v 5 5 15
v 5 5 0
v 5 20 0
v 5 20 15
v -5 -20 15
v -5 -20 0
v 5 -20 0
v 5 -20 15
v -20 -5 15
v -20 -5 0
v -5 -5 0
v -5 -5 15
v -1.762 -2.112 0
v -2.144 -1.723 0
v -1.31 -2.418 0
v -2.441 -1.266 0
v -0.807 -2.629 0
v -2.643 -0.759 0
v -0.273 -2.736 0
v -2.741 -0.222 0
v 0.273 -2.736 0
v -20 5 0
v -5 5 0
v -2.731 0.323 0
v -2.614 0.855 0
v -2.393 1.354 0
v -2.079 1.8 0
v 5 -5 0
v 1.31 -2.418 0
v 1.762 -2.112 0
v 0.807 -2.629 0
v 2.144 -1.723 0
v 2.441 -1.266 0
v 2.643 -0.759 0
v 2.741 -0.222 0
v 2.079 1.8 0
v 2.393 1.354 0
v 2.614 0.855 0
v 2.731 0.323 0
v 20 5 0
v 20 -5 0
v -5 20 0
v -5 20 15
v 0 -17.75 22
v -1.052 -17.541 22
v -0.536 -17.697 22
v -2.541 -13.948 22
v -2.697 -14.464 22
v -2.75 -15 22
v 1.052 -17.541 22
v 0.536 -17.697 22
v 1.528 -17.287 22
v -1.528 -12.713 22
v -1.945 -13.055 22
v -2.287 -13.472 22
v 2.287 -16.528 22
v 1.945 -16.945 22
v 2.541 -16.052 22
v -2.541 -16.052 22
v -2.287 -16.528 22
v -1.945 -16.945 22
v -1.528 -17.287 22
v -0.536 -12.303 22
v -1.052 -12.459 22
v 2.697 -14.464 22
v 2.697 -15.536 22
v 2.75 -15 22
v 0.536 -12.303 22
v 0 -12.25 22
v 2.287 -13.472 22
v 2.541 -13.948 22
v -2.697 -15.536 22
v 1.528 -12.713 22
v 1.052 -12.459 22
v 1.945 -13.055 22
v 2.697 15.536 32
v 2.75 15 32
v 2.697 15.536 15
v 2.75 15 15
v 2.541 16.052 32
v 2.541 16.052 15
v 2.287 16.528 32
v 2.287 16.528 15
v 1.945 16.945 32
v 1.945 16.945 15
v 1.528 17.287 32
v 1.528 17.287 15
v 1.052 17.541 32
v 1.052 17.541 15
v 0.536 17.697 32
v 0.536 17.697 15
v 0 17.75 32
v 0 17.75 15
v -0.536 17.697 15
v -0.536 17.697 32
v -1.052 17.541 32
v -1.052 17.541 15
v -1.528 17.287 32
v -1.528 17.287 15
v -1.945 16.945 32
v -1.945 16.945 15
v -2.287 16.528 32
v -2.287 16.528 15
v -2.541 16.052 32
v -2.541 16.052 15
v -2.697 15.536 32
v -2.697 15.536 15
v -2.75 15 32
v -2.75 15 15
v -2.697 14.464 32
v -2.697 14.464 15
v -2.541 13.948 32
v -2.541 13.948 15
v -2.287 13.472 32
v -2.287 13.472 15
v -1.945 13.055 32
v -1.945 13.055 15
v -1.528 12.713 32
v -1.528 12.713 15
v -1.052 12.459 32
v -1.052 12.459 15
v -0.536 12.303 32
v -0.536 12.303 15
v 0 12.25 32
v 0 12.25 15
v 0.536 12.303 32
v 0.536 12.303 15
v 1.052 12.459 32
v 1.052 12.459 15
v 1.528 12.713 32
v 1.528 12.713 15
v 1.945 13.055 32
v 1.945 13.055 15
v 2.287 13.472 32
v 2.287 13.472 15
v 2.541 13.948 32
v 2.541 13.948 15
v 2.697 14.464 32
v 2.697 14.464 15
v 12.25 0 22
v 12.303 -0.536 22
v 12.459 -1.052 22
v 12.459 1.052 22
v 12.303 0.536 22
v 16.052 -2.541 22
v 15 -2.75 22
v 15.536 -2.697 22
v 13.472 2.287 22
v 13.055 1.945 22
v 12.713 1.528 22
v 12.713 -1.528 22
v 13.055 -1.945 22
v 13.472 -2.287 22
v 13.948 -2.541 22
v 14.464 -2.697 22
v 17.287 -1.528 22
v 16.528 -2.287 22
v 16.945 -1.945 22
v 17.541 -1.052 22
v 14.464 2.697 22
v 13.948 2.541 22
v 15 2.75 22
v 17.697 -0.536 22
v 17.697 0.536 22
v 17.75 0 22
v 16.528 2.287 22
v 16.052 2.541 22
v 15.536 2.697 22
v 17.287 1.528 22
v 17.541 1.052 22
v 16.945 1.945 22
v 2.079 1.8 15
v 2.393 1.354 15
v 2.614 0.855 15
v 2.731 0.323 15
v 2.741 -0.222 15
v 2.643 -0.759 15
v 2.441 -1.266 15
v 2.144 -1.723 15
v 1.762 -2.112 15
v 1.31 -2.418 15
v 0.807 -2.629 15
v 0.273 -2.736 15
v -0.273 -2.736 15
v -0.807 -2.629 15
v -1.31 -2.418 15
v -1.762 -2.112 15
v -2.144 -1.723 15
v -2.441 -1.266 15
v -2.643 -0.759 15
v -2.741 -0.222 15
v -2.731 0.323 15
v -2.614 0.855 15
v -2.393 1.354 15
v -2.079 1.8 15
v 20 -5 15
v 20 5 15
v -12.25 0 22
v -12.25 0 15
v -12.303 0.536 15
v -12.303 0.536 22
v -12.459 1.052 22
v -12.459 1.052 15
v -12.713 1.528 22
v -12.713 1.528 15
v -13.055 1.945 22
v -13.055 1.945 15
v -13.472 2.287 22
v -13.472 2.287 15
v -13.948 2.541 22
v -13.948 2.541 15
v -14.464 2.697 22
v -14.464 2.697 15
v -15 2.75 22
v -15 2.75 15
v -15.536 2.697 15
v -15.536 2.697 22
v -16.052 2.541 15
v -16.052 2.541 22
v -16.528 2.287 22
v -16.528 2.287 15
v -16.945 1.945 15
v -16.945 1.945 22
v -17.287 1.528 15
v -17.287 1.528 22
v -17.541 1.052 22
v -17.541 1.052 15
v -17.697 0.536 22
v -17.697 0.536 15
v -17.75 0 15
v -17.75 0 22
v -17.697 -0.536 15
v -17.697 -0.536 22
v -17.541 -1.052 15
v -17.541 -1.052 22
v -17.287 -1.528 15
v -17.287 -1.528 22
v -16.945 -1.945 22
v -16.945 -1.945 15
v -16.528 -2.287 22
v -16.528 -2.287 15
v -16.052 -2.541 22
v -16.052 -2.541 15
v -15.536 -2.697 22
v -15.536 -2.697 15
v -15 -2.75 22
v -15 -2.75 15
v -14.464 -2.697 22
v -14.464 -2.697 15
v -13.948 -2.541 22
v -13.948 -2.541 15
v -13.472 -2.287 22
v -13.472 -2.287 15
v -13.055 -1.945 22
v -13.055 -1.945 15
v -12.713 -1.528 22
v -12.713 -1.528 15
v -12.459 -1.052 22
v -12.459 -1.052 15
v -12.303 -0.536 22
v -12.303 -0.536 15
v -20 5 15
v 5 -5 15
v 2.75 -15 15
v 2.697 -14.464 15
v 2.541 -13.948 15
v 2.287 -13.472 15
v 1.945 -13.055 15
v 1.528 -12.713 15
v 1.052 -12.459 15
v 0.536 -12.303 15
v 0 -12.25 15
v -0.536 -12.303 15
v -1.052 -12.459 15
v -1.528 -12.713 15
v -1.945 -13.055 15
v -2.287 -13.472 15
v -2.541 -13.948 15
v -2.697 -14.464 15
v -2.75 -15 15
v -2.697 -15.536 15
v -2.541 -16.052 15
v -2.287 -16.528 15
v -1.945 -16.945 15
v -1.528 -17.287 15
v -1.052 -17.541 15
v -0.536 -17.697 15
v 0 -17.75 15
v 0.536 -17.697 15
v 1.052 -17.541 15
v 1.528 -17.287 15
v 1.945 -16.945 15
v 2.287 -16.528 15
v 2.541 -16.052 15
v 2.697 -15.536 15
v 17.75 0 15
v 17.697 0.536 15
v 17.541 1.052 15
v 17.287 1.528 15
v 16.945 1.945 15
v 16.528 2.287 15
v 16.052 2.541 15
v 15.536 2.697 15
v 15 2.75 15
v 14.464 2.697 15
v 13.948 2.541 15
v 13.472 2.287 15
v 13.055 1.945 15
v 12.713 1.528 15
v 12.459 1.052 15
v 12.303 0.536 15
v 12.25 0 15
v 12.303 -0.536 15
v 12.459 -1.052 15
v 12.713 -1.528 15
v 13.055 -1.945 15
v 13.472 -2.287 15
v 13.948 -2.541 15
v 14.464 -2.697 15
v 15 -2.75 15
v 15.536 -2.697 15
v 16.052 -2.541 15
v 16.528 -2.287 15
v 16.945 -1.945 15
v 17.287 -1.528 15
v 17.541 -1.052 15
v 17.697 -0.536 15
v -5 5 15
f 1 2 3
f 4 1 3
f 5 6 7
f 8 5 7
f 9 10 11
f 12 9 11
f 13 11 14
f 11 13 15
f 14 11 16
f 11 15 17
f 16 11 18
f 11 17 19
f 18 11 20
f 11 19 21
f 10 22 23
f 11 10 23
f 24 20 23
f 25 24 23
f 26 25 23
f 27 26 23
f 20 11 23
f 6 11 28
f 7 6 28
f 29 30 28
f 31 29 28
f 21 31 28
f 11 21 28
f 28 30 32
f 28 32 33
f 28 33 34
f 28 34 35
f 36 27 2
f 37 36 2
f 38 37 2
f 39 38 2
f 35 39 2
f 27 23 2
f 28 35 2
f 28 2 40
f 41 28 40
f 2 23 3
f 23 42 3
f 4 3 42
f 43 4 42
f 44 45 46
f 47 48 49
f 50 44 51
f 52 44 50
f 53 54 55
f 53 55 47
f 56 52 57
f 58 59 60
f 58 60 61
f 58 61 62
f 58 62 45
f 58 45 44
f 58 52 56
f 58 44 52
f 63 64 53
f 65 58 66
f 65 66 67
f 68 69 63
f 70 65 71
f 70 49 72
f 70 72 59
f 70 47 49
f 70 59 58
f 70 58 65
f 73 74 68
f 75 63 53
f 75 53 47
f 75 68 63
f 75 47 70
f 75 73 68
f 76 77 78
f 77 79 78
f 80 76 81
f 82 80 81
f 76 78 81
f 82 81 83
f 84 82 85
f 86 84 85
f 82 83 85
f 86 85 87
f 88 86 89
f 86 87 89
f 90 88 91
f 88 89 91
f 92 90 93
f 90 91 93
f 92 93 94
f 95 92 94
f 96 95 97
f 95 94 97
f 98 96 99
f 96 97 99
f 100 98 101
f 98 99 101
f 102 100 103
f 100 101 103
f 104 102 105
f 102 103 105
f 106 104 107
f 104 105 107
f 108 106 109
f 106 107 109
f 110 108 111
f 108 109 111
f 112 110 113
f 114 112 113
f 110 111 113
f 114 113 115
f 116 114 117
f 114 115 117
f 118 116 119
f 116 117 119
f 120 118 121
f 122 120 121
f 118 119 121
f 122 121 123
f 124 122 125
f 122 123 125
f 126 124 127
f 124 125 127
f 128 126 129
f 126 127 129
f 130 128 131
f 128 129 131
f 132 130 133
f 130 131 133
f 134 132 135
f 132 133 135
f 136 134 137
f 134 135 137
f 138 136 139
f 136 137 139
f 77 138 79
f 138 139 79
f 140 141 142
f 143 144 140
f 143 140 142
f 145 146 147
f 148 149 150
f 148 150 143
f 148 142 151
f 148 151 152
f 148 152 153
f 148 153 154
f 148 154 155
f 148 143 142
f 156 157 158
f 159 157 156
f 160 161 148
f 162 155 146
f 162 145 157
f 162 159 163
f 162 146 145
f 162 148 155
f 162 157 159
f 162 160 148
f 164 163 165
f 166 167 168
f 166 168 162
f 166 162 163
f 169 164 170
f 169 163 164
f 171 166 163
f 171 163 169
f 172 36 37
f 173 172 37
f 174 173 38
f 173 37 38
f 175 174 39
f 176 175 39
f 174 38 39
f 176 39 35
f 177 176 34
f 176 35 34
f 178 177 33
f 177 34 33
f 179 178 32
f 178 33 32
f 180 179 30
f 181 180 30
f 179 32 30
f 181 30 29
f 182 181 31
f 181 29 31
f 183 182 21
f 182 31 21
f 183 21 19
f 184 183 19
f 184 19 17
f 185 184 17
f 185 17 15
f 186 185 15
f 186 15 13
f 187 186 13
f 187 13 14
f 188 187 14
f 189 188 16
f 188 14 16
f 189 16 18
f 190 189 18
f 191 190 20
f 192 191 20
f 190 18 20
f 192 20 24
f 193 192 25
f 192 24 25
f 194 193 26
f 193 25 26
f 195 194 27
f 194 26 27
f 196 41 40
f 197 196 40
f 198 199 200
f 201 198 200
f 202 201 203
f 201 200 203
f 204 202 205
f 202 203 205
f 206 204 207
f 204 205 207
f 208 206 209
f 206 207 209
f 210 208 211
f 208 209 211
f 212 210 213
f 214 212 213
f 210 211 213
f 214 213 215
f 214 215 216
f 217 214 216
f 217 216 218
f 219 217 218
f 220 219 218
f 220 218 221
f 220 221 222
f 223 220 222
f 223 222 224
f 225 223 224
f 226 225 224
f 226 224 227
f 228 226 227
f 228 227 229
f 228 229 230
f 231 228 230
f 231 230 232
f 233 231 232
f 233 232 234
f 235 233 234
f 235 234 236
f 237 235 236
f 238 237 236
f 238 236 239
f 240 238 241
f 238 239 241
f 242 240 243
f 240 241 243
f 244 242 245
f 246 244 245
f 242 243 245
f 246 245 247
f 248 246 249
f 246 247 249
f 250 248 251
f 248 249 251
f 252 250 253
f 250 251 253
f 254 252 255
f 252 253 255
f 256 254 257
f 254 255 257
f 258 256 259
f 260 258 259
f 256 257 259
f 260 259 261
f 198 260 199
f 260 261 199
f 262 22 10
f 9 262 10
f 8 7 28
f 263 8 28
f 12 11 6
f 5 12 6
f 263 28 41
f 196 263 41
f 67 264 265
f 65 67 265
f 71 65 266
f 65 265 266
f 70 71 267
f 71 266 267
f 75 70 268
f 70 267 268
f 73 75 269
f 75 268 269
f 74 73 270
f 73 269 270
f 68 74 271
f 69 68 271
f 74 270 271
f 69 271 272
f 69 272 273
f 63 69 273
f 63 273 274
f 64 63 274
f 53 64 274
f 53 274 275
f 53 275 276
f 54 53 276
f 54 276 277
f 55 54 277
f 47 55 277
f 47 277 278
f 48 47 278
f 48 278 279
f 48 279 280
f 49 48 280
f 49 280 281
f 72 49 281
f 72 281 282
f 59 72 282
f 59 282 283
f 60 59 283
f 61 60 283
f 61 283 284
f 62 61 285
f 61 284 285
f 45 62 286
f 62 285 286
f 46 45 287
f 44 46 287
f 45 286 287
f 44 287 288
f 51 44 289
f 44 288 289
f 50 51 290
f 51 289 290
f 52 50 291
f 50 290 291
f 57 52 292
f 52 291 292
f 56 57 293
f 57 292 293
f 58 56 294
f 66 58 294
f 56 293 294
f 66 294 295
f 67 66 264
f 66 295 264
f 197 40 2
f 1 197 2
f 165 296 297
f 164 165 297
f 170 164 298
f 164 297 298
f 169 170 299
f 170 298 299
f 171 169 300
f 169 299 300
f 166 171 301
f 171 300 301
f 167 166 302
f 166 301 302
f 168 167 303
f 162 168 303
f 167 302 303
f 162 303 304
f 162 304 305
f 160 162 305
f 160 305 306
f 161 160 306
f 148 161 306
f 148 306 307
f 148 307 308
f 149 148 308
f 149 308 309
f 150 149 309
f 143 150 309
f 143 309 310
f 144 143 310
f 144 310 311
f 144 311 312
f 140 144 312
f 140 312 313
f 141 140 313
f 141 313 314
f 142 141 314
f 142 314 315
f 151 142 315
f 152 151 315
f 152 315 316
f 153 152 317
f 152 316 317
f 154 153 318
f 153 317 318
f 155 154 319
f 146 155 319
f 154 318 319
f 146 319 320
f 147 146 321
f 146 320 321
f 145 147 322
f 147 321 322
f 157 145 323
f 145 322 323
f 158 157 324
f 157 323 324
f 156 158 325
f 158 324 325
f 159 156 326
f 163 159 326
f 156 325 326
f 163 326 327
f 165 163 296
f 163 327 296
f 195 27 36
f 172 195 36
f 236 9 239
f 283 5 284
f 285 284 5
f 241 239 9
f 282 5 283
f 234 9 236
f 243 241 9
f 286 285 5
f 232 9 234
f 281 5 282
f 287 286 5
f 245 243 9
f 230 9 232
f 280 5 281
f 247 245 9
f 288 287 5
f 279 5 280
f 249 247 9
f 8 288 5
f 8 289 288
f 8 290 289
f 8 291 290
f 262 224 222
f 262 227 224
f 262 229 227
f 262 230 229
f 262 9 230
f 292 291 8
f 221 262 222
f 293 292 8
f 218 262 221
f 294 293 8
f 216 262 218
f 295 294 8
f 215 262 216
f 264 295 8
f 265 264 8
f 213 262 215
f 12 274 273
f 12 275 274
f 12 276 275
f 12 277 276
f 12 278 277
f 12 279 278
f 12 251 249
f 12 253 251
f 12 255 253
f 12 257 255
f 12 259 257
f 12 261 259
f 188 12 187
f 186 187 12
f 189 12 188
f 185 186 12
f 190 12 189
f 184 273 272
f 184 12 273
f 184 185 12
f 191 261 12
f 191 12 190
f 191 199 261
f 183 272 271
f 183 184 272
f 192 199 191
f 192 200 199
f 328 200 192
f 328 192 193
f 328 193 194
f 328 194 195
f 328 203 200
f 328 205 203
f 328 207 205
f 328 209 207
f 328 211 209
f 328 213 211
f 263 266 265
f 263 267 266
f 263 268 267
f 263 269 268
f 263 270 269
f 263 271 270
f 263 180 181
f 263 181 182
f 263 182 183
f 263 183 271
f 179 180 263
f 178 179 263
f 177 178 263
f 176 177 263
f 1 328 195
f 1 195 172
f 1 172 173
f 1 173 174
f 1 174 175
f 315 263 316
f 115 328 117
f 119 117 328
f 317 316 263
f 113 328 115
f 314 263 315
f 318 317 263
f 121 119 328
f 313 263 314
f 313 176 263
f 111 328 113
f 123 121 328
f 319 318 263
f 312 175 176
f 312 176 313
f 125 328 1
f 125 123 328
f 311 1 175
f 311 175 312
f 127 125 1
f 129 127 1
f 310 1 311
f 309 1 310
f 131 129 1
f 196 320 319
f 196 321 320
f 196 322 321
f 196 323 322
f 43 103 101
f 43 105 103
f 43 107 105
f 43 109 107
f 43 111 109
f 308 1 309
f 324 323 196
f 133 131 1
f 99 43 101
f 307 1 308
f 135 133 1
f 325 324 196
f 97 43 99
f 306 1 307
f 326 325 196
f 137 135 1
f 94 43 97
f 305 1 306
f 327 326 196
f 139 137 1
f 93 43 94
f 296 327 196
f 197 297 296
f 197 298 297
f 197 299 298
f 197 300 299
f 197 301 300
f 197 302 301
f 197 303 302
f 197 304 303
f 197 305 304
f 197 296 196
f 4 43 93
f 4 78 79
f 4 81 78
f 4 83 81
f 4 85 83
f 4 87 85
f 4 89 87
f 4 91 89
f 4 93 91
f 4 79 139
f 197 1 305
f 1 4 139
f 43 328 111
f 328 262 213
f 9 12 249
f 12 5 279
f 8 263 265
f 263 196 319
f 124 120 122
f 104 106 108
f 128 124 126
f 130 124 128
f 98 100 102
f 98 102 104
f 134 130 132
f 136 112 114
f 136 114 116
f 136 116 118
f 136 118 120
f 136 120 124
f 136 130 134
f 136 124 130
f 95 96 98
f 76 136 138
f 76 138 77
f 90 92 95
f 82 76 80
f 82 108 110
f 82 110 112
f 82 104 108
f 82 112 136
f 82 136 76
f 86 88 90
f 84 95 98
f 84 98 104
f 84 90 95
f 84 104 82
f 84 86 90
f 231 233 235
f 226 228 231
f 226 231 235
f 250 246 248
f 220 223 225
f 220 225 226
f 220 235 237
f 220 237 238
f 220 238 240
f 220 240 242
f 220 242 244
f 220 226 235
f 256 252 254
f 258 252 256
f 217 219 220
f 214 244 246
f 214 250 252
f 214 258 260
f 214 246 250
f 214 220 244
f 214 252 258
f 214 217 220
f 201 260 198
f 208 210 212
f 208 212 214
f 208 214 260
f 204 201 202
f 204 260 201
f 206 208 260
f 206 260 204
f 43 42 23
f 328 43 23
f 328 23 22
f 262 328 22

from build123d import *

# Parameters (mm, degrees)
F0_R     = 2.75
F1_DEPTH = 15
F2_R     = 2.75
F3_DEPTH = 22
F4_R     = 2.75
F5_DEPTH = 10


with BuildPart() as f1:
    # F0 (on Top) → F1 (new body)
    with BuildSketch(Plane.XY):
        Polygon((20, -5), (20, 5), (5, 5), (5, 20), (-5, 20), (-5, 5), (-20, 5), (-20, -5), (-5, -5), (-5, -20), (5, -20), (5, -5), align=None)
        with Locations((0, -15)):
            Circle(F0_R, mode=Mode.SUBTRACT)
        with BuildLine():
            ThreePointArc((2.079062, 1.8), (0, -2.75), (-2.079062, 1.8))
            Line((-2.079062, 1.8), (2.079062, 1.8))
        make_face(mode=Mode.SUBTRACT)
        with Locations((-15, 0)):
            Circle(F0_R, mode=Mode.SUBTRACT)
        with Locations((15, 0)):
            Circle(F0_R, mode=Mode.SUBTRACT)
        with Locations((0, 15)):
            Circle(F0_R, mode=Mode.SUBTRACT)
    extrude(amount=F1_DEPTH)

    # F2 (on Top) → F3 (join)
    with BuildSketch(Plane.XY):
        with Locations((0, 15)):
            Circle(F2_R)
        with Locations((15, 0)):
            Circle(F2_R)
        with Locations((0, -15)):
            Circle(F2_R)
        with Locations((-15, 0)):
            Circle(F2_R)
    extrude(amount=F3_DEPTH)

    # F4 (on face) → F5 (join)
    with BuildSketch(Plane.XY.offset(22)):
        with Locations((0, 15)):
            Circle(F4_R)
    extrude(amount=F5_DEPTH)


solid = f1.part
